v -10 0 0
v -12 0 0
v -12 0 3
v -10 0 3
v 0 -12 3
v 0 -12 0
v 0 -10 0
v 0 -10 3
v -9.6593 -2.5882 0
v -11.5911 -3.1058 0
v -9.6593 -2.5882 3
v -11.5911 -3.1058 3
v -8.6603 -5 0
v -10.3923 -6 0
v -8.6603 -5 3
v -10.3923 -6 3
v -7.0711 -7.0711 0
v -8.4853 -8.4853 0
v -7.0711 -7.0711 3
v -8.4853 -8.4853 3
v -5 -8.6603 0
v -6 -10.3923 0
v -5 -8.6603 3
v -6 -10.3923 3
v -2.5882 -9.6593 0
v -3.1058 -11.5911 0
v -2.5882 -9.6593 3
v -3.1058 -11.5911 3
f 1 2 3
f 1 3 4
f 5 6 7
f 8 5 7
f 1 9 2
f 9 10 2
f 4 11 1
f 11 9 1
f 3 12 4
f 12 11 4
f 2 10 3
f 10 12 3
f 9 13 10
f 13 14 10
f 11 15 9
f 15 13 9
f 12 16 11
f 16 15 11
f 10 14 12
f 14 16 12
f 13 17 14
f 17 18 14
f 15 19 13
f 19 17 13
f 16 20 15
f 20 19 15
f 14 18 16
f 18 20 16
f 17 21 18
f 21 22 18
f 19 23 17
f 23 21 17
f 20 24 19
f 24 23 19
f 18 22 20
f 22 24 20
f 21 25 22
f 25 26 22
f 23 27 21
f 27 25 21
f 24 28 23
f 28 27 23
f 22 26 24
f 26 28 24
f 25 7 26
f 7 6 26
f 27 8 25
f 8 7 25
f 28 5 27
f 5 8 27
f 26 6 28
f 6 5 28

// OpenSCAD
// oracle: tris
rotate_extrude(angle=90, $fn=24)
    translate([-12, 0]) square([2, 3]);
